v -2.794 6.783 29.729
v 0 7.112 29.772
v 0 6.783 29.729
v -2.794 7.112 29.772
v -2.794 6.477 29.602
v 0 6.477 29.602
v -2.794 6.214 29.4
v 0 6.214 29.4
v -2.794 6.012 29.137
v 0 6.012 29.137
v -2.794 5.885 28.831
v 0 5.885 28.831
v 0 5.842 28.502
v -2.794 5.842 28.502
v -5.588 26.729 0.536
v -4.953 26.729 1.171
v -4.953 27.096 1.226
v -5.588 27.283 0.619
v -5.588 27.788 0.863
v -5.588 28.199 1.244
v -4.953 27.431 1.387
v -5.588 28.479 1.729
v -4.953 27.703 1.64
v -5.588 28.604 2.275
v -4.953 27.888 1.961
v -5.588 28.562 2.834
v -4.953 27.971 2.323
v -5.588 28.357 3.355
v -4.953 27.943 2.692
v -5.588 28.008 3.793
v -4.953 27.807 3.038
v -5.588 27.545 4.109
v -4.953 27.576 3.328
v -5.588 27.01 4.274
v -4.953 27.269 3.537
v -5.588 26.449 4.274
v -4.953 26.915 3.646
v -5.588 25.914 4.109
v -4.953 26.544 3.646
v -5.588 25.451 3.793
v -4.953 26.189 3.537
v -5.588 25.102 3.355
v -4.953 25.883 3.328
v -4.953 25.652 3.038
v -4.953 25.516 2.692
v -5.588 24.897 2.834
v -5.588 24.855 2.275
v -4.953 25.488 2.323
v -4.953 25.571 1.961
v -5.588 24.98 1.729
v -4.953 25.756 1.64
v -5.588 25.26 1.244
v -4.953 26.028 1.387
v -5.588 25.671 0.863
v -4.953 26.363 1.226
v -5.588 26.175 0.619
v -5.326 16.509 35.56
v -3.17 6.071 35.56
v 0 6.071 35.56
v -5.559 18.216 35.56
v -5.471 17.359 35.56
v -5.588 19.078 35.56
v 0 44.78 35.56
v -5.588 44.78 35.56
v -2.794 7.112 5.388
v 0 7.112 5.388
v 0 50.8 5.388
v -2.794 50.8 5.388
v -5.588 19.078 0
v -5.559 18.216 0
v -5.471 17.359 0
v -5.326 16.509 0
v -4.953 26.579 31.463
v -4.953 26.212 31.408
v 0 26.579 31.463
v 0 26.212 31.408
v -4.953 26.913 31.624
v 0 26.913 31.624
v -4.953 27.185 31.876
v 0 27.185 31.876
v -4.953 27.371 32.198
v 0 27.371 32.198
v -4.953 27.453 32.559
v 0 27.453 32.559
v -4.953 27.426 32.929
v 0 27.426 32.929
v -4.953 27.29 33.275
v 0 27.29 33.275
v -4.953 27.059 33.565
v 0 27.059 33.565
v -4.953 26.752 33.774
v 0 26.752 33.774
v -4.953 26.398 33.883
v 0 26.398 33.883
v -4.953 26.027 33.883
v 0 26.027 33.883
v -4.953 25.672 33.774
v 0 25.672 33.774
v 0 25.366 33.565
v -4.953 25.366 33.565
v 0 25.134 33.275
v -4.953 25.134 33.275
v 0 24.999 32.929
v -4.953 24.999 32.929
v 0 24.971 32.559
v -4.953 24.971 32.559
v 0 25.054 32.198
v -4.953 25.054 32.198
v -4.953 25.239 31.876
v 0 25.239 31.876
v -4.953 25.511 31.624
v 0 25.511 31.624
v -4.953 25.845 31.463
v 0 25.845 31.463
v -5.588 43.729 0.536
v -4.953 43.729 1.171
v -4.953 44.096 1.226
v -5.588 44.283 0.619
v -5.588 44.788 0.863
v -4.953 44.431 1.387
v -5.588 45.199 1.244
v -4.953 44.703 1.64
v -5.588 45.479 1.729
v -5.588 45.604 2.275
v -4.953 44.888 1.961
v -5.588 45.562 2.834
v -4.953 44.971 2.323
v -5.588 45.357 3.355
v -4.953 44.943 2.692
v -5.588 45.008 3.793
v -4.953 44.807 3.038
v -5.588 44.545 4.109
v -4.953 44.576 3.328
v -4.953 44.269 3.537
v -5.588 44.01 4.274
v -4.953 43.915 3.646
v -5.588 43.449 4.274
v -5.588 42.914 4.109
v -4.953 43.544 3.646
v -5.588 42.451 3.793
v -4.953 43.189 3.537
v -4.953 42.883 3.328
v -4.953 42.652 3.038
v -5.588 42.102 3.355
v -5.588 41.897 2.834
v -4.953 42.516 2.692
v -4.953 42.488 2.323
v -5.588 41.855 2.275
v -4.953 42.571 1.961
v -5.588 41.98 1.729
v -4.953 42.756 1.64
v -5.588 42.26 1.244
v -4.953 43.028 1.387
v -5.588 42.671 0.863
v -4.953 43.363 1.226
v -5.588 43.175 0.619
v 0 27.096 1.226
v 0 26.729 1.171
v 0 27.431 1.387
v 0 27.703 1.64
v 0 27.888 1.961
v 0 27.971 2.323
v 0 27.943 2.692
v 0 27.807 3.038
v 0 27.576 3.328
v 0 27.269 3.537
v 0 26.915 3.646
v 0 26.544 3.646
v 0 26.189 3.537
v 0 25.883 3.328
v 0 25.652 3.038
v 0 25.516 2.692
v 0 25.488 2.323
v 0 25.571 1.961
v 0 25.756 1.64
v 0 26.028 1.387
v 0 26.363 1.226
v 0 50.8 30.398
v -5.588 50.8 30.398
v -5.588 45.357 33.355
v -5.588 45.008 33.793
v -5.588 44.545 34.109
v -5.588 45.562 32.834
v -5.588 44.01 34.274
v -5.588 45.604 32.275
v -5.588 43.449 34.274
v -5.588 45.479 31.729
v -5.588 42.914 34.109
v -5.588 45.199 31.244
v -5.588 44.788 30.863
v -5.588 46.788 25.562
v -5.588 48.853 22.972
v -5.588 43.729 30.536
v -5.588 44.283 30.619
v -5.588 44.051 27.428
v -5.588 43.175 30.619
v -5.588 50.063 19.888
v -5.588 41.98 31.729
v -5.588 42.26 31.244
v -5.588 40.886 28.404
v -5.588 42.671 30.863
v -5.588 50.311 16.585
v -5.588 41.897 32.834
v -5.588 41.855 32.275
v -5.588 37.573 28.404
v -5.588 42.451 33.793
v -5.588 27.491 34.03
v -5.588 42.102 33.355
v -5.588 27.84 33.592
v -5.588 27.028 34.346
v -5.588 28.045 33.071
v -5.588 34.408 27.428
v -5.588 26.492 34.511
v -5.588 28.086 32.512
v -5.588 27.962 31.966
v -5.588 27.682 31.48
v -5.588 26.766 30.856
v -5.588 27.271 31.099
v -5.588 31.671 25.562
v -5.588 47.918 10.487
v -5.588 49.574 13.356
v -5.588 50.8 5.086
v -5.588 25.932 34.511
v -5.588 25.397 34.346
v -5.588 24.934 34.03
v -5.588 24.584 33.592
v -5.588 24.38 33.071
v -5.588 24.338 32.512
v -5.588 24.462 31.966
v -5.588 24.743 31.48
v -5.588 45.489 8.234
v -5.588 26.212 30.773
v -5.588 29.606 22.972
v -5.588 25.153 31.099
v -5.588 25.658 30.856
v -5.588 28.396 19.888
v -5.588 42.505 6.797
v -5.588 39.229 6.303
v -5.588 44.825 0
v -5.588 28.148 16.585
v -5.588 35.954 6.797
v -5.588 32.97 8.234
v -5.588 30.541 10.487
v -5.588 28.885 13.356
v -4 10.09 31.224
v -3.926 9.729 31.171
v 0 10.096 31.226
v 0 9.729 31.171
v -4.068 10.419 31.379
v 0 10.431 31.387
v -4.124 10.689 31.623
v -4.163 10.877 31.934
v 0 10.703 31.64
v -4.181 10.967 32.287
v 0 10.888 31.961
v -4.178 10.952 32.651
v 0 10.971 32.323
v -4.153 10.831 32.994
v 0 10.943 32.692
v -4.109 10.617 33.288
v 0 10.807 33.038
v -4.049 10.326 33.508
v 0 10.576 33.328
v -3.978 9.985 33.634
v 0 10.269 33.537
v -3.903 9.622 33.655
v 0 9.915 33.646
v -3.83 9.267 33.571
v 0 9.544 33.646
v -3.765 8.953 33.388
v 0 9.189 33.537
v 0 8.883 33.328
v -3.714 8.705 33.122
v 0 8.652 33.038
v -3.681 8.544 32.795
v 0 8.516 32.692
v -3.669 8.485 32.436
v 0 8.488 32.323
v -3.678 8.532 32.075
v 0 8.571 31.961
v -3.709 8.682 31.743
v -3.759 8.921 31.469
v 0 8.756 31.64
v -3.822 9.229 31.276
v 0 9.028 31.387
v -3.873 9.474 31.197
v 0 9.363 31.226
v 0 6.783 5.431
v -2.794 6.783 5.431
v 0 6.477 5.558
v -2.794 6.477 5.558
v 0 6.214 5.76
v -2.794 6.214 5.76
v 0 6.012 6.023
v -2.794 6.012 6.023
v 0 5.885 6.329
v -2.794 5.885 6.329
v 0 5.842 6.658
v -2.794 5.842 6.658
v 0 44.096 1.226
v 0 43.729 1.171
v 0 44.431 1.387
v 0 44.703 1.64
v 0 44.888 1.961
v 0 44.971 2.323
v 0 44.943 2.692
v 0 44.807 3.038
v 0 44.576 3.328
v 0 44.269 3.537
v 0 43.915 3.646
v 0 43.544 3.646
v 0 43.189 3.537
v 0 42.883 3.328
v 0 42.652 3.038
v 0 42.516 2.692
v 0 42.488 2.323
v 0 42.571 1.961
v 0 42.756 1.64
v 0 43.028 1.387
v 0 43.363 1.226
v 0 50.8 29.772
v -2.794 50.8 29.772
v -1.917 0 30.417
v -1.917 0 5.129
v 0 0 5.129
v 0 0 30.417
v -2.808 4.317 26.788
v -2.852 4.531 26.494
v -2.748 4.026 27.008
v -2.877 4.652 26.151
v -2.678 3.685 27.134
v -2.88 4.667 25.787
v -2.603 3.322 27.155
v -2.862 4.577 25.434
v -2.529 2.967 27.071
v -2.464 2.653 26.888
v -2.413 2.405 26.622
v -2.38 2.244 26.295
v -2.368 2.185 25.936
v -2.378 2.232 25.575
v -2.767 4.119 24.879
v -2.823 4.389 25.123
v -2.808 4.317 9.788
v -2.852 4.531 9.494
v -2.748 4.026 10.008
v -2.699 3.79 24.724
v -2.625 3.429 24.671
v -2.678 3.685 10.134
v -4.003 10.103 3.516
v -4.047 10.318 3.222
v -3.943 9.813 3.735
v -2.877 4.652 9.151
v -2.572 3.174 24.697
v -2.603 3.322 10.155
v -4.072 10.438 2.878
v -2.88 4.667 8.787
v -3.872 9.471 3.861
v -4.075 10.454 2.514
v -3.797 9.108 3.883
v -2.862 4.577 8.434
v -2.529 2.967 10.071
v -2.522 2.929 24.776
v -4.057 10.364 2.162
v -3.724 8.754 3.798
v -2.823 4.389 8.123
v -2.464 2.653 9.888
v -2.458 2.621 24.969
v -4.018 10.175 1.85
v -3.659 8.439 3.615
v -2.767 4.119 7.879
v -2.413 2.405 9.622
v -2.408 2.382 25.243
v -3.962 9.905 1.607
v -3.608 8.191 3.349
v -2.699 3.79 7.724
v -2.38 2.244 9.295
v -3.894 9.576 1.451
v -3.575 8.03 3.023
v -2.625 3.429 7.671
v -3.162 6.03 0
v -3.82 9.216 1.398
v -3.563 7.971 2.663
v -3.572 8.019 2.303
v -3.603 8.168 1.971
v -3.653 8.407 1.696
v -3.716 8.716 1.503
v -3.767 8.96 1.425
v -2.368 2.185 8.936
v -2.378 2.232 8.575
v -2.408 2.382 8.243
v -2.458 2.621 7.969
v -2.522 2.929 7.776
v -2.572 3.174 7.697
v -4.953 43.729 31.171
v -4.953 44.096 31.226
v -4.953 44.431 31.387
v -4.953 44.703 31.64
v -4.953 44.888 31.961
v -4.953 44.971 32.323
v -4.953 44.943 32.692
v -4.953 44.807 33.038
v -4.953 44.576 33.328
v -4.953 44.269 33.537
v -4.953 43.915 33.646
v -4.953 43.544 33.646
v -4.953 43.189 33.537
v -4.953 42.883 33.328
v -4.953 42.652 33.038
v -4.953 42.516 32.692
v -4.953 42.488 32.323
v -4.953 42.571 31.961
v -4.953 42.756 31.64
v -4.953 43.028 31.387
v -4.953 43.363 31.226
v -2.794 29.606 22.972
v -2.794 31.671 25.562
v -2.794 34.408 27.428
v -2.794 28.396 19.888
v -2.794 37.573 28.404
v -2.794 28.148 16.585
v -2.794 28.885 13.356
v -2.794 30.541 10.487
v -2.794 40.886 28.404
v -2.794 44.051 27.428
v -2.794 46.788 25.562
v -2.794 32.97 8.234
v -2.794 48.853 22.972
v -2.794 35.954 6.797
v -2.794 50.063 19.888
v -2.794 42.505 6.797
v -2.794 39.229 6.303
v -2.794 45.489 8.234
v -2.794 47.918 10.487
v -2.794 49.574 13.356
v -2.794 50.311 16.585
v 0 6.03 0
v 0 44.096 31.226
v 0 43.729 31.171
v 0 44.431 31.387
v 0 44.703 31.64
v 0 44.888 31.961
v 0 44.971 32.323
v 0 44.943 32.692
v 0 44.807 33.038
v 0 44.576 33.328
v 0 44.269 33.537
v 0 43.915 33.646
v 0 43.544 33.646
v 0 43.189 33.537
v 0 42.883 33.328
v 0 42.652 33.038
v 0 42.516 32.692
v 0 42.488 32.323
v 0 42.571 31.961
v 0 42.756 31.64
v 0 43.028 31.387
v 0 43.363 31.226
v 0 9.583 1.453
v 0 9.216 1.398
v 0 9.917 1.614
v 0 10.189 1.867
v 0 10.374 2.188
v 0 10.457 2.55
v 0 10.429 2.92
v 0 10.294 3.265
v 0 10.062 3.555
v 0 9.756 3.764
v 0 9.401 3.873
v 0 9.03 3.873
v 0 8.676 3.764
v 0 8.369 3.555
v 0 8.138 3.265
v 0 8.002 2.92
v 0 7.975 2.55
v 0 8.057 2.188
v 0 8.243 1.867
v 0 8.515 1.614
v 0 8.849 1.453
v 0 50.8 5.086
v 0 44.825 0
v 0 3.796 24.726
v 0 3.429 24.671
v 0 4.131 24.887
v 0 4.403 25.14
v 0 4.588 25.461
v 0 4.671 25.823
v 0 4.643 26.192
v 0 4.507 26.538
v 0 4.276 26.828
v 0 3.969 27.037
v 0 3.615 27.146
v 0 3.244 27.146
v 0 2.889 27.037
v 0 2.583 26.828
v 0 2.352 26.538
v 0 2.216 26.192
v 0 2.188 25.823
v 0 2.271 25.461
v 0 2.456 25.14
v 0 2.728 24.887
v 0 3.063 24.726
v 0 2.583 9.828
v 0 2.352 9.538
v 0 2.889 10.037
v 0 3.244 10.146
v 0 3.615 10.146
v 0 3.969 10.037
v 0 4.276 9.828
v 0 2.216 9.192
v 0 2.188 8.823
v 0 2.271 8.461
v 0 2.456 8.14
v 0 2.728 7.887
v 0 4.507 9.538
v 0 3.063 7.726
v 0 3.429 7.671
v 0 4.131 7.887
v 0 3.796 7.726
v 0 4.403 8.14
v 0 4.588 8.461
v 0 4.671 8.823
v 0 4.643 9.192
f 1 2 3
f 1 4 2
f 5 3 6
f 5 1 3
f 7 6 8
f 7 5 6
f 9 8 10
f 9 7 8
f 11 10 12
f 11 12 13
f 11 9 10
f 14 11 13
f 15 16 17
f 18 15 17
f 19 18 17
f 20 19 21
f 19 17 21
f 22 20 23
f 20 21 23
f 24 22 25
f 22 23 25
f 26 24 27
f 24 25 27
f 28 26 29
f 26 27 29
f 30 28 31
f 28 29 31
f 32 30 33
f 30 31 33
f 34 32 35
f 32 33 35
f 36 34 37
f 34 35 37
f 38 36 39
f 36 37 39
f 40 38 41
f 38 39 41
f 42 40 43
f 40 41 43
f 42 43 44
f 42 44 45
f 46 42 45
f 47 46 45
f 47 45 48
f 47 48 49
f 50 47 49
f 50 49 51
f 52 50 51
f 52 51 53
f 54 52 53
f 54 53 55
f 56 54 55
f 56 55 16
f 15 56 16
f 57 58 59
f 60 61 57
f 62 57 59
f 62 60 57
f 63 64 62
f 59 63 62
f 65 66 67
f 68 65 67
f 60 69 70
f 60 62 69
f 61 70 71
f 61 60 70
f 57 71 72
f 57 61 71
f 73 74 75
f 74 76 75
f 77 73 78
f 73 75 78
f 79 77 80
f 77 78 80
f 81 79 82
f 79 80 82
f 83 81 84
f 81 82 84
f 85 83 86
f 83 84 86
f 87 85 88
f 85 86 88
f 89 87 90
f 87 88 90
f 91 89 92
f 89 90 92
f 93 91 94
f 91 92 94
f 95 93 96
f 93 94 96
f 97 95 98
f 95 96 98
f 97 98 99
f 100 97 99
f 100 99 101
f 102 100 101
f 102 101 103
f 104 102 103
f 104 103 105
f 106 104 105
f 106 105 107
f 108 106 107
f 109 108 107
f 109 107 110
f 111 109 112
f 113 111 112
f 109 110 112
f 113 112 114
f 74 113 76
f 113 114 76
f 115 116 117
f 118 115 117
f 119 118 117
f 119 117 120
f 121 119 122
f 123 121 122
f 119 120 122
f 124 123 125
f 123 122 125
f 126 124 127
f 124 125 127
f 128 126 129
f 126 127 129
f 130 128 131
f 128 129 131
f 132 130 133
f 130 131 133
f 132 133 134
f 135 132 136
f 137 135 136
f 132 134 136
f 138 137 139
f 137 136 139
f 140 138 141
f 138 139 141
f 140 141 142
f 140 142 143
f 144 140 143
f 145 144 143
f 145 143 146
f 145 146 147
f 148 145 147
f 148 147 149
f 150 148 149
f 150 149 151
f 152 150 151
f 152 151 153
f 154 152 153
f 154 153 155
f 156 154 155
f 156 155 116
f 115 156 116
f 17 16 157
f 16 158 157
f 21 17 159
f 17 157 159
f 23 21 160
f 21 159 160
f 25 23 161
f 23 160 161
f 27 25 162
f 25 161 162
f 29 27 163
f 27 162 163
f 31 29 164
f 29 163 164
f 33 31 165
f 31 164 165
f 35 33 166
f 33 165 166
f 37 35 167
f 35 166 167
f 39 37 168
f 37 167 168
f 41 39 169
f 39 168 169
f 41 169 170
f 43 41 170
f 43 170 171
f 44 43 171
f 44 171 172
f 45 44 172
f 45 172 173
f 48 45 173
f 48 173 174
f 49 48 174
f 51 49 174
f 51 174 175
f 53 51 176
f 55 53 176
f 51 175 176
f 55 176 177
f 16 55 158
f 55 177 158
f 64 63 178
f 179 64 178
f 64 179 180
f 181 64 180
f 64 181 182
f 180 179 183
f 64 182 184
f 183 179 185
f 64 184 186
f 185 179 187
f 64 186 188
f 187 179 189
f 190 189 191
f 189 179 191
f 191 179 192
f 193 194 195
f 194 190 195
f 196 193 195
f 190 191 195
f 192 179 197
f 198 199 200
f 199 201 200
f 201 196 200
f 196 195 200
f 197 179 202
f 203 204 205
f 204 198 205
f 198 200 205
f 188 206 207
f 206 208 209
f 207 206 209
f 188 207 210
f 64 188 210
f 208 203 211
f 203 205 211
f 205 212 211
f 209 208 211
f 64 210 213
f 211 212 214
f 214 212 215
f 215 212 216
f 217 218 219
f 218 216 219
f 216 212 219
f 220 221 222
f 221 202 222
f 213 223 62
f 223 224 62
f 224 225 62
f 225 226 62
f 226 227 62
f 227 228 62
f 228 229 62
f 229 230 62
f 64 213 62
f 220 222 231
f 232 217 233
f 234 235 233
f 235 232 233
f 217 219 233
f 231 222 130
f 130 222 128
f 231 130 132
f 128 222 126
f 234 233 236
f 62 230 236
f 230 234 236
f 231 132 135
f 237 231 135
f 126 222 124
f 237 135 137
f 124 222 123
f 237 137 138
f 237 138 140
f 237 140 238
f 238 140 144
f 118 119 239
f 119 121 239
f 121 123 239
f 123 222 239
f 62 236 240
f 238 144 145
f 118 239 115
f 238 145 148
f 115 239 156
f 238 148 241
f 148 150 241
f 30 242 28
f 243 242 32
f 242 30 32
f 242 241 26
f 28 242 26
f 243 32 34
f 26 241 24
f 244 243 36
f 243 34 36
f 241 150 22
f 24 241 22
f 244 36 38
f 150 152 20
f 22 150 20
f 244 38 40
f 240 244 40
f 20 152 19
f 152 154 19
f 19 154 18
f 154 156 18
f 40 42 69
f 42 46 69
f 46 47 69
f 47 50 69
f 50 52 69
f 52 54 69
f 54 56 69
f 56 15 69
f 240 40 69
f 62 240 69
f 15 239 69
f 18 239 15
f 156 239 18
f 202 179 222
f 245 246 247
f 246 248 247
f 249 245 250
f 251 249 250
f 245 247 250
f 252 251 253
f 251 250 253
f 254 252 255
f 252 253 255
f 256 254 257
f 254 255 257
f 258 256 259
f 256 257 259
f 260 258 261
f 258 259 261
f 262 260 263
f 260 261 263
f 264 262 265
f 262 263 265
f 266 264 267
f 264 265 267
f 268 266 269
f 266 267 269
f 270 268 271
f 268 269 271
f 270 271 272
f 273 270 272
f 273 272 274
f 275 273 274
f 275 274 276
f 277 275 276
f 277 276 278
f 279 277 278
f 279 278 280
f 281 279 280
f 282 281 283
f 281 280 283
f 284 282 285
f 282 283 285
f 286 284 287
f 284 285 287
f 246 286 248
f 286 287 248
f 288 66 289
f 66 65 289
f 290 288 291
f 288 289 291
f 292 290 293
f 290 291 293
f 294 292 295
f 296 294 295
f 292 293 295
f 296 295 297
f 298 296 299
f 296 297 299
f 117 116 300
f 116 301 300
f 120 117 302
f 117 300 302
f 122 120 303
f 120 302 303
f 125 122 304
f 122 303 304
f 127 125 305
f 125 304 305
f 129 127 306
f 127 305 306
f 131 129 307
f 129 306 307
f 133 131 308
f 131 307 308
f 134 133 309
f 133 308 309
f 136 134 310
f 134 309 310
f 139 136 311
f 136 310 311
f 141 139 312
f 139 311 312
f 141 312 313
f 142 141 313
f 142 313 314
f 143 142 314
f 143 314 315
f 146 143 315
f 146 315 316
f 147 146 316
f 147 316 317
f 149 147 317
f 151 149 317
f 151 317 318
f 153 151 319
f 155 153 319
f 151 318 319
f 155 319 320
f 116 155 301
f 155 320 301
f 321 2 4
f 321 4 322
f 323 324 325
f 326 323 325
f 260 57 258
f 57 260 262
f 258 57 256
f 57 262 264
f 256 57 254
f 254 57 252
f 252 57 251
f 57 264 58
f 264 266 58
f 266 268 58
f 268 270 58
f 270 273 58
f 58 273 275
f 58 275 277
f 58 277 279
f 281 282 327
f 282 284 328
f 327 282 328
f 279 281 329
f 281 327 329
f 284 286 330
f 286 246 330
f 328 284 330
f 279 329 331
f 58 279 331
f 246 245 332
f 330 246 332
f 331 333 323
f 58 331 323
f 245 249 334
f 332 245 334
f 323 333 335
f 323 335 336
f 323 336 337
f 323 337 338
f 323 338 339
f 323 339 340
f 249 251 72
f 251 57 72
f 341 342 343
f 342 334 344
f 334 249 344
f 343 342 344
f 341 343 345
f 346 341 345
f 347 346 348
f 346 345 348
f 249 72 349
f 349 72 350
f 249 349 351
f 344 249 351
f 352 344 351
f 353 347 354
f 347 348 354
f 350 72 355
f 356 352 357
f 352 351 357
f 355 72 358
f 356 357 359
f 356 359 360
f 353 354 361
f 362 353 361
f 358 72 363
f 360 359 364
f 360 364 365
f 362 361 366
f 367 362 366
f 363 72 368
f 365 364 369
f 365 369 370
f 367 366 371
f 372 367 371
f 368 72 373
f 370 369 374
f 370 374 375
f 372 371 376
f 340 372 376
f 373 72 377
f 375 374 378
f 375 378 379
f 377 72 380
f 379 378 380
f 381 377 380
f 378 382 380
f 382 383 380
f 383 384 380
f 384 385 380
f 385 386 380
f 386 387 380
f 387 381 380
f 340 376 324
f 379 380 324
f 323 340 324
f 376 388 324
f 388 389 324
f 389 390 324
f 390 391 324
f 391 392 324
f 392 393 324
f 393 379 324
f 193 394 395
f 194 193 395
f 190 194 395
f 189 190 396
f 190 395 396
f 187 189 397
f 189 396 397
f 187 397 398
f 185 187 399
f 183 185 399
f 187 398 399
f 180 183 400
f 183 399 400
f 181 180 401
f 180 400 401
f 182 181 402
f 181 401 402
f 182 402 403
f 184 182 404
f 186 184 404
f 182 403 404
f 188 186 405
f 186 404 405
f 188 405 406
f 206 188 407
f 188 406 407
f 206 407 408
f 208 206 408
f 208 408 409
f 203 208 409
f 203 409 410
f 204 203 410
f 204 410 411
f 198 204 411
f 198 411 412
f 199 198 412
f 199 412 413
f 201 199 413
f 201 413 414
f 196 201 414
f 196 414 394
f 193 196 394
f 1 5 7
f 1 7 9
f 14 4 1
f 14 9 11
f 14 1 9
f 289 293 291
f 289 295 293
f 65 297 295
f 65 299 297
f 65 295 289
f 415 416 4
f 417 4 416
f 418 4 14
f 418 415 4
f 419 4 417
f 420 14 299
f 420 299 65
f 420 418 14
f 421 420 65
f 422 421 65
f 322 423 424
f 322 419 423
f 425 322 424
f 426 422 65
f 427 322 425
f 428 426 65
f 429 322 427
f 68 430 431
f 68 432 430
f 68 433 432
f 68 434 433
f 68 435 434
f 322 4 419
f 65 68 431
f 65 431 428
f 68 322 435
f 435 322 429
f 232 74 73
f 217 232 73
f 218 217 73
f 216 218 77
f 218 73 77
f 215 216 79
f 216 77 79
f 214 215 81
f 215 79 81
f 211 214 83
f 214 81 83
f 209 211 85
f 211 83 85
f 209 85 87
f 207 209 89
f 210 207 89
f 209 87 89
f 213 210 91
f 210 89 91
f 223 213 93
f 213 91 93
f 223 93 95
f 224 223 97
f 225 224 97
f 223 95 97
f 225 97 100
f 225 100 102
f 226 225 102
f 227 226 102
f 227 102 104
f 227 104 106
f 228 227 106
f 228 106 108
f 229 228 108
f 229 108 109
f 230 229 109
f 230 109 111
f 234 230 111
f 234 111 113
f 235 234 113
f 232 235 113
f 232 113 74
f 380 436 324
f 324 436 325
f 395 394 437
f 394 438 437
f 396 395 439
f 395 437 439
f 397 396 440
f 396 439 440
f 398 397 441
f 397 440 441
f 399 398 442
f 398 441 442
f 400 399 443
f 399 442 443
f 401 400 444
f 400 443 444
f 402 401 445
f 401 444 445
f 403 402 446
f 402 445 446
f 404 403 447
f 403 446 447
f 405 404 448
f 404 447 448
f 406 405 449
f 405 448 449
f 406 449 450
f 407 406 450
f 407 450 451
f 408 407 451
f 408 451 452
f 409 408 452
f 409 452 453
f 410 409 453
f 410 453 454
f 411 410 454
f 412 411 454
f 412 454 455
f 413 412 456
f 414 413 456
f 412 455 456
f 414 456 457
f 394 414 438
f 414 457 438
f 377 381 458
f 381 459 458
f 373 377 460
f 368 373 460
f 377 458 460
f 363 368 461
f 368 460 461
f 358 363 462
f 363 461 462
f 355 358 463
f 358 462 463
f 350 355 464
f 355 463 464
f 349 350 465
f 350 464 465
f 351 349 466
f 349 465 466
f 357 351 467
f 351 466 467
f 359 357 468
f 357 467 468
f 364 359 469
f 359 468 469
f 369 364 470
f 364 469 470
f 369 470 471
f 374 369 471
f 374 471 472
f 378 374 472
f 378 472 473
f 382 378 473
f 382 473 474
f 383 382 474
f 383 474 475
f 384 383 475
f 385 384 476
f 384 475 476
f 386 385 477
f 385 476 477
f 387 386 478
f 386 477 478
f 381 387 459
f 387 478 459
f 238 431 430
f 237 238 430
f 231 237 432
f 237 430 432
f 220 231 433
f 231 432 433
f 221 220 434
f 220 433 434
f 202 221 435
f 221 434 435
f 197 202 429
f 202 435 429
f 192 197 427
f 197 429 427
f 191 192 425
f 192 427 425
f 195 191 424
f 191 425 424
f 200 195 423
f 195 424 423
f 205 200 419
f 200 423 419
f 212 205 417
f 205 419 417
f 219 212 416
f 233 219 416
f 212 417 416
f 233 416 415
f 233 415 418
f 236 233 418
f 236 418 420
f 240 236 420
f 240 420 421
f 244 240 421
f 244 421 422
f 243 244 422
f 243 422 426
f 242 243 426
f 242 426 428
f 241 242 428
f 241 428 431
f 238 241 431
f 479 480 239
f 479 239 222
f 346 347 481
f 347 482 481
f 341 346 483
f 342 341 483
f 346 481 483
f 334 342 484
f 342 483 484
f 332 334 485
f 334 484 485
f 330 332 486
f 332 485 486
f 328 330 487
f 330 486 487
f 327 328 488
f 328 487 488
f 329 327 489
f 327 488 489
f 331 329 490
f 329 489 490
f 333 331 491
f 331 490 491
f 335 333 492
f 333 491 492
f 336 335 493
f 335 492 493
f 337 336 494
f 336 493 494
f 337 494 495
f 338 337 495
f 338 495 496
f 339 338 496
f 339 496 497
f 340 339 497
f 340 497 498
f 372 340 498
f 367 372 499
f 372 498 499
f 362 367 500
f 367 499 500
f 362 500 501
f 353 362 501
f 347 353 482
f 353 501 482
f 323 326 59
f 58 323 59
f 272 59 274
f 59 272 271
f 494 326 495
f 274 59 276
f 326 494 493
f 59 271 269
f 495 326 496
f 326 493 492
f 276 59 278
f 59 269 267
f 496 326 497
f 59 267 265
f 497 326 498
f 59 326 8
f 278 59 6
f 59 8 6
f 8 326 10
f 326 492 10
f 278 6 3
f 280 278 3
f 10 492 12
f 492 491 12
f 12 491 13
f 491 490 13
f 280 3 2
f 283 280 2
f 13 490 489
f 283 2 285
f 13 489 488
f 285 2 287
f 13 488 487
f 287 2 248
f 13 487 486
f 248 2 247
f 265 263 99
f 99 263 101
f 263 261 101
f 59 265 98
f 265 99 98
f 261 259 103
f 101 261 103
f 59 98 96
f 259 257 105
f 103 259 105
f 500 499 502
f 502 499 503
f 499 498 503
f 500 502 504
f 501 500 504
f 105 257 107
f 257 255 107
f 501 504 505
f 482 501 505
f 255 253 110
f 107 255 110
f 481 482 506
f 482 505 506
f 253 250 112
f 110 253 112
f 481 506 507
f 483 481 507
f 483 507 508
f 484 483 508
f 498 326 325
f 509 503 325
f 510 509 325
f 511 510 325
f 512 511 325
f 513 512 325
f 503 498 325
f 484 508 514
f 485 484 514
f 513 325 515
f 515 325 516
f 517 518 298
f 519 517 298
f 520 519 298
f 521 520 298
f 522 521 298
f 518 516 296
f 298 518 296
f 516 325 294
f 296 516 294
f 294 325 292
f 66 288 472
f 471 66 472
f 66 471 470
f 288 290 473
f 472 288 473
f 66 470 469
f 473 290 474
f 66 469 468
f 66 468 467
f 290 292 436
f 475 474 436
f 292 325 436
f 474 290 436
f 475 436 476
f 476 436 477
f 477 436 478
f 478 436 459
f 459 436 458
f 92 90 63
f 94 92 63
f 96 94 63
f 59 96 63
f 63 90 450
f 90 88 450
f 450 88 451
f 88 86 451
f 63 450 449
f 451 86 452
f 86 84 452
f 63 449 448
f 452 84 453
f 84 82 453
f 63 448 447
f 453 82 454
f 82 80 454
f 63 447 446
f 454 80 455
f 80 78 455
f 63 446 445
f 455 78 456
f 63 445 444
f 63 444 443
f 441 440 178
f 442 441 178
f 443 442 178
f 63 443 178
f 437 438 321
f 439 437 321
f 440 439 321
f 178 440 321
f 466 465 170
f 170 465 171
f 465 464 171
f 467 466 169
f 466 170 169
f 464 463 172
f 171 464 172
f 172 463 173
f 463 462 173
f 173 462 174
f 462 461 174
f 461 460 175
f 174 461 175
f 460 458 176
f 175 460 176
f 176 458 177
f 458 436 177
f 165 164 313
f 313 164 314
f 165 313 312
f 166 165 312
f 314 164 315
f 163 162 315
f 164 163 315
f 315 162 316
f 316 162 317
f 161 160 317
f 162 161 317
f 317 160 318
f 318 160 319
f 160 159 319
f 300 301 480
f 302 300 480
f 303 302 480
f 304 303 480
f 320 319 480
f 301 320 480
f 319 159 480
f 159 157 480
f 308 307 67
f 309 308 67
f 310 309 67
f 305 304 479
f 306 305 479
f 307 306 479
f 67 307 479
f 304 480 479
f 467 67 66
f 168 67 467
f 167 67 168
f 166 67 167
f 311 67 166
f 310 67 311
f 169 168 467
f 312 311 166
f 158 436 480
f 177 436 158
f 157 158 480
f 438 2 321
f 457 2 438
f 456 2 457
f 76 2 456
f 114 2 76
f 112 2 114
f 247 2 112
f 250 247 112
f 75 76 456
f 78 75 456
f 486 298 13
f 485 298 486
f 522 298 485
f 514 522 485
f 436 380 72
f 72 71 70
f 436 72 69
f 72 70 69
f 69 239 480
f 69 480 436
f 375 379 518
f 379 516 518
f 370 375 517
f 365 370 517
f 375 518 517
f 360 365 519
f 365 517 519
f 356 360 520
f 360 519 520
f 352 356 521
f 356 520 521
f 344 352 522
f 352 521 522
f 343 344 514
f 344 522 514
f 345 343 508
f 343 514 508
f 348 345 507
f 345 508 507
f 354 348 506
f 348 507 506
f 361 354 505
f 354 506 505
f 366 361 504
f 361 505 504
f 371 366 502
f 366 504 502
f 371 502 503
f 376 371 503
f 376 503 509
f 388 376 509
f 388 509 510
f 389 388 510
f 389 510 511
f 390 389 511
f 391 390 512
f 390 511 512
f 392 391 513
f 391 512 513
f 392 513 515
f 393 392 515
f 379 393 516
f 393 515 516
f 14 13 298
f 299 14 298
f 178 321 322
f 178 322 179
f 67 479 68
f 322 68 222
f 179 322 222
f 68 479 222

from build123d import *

# Parameters (mm, degrees)
BOSS_EXTRUDE1_DEPTH                   = 35.56
FILLET1_R                             = 12.7
F_7_8_0_875_DIAMETER_HOLE1_D          = 22.225
SKETCH6_W                             = 24.384
SKETCH6_H                             = 44.958
CUT_EXTRUDE1_DEPTH                    = 2.794
FILLET2_R                             = 1.27
F_40_0_098_DIAMETER_HOLE1_D           = 2.4892
F_40_0_098_DIAMETER_HOLE1_CSINK_D     = 3.7592
F_40_0_098_DIAMETER_HOLE1_CSINK_ANGLE = 90
CUT_EXTRUDE3_DEPTH                    = 63.260576162
CUT_EXTRUDE4_DEPTH                    = 63.260576162


with BuildPart() as part:
    # Sketch1 → Boss-Extrude1 (new body)
    with BuildSketch(Plane.XY):
        Polygon((0, 0), (0, 50.8), (-5.588, 50.8), (-5.588, 17.78), (-1.916643762, 0), align=None)
    extrude(amount=BOSS_EXTRUDE1_DEPTH)

    # Fillet1
    fillet1_edges = [part.edges().sort_by_distance(p)[0] for p in [
        (-5.588, 17.78, 17.78),
    ]]
    fillet(fillet1_edges, radius=FILLET1_R)

    # 7/8 (0.875) Diameter Hole1 (through all)
    with Locations(Plane.ZY.offset(5.588)):
        with Locations((17.415519888, 39.229457165)):
            Hole(F_7_8_0_875_DIAMETER_HOLE1_D / 2)

    # Sketch6 → Cut-Extrude1 (cut)
    with BuildSketch(Plane(origin=(0, 0, 0), x_dir=(0, 0, -1), z_dir=(1, 0, 0))):
        with Locations((-17.580042727, 28.321)):
            Rectangle(SKETCH6_W, SKETCH6_H)
    extrude(amount=-CUT_EXTRUDE1_DEPTH, mode=Mode.SUBTRACT)

    # Fillet2
    fillet2_edges = [part.edges().sort_by_distance(p)[0] for p in [
        (-1.397, 5.842, 29.772042727),
        (-1.397, 5.842, 5.388042727),
    ]]
    fillet(fillet2_edges, radius=FILLET2_R)

    # #40 (0.098) Diameter Hole1 (through all)
    with Locations(Plane.ZY.offset(5.588)):
        with Locations((32.415519888, 43.729457165), (32.652313364, 26.212120957), (32.415519888, 9.729457165), (25.915519888, 3.429457165), (8.915519888, 3.429457165), (2.642788208, 9.215688736), (2.415519888, 26.729457165), (2.415519888, 43.729457165)):
            CounterSinkHole(F_40_0_098_DIAMETER_HOLE1_D / 2, F_40_0_098_DIAMETER_HOLE1_CSINK_D / 2, counter_sink_angle=F_40_0_098_DIAMETER_HOLE1_CSINK_ANGLE)

    # Sketch10 → Cut-Extrude3 (cut, through all)
    with BuildSketch(Plane(origin=(0, 0, 0), x_dir=(0, 0, -1), z_dir=(1, 0, 0))):
        Polygon((-35.56, 44.780420684), (-30.397580851, 50.8), (-35.56, 50.8), align=None)
    extrude(amount=-CUT_EXTRUDE3_DEPTH, mode=Mode.SUBTRACT)

    # Sketch11 → Cut-Extrude4 (cut, through all)
    with BuildSketch(Plane(origin=(0, 0, 0), x_dir=(0, 0, -1), z_dir=(1, 0, 0))):
        Polygon((-5.085545117, 50.8), (0, 50.8), (0, 44.824895363), align=None)
        Polygon((0, 6.029531172), (-5.128692816, 0), (0, 0), align=None)
        Polygon((-35.56, 6.07121688), (-35.56, 0), (-30.417091858, 0), align=None)
    extrude(amount=-CUT_EXTRUDE4_DEPTH, mode=Mode.SUBTRACT)


solid = part.part
